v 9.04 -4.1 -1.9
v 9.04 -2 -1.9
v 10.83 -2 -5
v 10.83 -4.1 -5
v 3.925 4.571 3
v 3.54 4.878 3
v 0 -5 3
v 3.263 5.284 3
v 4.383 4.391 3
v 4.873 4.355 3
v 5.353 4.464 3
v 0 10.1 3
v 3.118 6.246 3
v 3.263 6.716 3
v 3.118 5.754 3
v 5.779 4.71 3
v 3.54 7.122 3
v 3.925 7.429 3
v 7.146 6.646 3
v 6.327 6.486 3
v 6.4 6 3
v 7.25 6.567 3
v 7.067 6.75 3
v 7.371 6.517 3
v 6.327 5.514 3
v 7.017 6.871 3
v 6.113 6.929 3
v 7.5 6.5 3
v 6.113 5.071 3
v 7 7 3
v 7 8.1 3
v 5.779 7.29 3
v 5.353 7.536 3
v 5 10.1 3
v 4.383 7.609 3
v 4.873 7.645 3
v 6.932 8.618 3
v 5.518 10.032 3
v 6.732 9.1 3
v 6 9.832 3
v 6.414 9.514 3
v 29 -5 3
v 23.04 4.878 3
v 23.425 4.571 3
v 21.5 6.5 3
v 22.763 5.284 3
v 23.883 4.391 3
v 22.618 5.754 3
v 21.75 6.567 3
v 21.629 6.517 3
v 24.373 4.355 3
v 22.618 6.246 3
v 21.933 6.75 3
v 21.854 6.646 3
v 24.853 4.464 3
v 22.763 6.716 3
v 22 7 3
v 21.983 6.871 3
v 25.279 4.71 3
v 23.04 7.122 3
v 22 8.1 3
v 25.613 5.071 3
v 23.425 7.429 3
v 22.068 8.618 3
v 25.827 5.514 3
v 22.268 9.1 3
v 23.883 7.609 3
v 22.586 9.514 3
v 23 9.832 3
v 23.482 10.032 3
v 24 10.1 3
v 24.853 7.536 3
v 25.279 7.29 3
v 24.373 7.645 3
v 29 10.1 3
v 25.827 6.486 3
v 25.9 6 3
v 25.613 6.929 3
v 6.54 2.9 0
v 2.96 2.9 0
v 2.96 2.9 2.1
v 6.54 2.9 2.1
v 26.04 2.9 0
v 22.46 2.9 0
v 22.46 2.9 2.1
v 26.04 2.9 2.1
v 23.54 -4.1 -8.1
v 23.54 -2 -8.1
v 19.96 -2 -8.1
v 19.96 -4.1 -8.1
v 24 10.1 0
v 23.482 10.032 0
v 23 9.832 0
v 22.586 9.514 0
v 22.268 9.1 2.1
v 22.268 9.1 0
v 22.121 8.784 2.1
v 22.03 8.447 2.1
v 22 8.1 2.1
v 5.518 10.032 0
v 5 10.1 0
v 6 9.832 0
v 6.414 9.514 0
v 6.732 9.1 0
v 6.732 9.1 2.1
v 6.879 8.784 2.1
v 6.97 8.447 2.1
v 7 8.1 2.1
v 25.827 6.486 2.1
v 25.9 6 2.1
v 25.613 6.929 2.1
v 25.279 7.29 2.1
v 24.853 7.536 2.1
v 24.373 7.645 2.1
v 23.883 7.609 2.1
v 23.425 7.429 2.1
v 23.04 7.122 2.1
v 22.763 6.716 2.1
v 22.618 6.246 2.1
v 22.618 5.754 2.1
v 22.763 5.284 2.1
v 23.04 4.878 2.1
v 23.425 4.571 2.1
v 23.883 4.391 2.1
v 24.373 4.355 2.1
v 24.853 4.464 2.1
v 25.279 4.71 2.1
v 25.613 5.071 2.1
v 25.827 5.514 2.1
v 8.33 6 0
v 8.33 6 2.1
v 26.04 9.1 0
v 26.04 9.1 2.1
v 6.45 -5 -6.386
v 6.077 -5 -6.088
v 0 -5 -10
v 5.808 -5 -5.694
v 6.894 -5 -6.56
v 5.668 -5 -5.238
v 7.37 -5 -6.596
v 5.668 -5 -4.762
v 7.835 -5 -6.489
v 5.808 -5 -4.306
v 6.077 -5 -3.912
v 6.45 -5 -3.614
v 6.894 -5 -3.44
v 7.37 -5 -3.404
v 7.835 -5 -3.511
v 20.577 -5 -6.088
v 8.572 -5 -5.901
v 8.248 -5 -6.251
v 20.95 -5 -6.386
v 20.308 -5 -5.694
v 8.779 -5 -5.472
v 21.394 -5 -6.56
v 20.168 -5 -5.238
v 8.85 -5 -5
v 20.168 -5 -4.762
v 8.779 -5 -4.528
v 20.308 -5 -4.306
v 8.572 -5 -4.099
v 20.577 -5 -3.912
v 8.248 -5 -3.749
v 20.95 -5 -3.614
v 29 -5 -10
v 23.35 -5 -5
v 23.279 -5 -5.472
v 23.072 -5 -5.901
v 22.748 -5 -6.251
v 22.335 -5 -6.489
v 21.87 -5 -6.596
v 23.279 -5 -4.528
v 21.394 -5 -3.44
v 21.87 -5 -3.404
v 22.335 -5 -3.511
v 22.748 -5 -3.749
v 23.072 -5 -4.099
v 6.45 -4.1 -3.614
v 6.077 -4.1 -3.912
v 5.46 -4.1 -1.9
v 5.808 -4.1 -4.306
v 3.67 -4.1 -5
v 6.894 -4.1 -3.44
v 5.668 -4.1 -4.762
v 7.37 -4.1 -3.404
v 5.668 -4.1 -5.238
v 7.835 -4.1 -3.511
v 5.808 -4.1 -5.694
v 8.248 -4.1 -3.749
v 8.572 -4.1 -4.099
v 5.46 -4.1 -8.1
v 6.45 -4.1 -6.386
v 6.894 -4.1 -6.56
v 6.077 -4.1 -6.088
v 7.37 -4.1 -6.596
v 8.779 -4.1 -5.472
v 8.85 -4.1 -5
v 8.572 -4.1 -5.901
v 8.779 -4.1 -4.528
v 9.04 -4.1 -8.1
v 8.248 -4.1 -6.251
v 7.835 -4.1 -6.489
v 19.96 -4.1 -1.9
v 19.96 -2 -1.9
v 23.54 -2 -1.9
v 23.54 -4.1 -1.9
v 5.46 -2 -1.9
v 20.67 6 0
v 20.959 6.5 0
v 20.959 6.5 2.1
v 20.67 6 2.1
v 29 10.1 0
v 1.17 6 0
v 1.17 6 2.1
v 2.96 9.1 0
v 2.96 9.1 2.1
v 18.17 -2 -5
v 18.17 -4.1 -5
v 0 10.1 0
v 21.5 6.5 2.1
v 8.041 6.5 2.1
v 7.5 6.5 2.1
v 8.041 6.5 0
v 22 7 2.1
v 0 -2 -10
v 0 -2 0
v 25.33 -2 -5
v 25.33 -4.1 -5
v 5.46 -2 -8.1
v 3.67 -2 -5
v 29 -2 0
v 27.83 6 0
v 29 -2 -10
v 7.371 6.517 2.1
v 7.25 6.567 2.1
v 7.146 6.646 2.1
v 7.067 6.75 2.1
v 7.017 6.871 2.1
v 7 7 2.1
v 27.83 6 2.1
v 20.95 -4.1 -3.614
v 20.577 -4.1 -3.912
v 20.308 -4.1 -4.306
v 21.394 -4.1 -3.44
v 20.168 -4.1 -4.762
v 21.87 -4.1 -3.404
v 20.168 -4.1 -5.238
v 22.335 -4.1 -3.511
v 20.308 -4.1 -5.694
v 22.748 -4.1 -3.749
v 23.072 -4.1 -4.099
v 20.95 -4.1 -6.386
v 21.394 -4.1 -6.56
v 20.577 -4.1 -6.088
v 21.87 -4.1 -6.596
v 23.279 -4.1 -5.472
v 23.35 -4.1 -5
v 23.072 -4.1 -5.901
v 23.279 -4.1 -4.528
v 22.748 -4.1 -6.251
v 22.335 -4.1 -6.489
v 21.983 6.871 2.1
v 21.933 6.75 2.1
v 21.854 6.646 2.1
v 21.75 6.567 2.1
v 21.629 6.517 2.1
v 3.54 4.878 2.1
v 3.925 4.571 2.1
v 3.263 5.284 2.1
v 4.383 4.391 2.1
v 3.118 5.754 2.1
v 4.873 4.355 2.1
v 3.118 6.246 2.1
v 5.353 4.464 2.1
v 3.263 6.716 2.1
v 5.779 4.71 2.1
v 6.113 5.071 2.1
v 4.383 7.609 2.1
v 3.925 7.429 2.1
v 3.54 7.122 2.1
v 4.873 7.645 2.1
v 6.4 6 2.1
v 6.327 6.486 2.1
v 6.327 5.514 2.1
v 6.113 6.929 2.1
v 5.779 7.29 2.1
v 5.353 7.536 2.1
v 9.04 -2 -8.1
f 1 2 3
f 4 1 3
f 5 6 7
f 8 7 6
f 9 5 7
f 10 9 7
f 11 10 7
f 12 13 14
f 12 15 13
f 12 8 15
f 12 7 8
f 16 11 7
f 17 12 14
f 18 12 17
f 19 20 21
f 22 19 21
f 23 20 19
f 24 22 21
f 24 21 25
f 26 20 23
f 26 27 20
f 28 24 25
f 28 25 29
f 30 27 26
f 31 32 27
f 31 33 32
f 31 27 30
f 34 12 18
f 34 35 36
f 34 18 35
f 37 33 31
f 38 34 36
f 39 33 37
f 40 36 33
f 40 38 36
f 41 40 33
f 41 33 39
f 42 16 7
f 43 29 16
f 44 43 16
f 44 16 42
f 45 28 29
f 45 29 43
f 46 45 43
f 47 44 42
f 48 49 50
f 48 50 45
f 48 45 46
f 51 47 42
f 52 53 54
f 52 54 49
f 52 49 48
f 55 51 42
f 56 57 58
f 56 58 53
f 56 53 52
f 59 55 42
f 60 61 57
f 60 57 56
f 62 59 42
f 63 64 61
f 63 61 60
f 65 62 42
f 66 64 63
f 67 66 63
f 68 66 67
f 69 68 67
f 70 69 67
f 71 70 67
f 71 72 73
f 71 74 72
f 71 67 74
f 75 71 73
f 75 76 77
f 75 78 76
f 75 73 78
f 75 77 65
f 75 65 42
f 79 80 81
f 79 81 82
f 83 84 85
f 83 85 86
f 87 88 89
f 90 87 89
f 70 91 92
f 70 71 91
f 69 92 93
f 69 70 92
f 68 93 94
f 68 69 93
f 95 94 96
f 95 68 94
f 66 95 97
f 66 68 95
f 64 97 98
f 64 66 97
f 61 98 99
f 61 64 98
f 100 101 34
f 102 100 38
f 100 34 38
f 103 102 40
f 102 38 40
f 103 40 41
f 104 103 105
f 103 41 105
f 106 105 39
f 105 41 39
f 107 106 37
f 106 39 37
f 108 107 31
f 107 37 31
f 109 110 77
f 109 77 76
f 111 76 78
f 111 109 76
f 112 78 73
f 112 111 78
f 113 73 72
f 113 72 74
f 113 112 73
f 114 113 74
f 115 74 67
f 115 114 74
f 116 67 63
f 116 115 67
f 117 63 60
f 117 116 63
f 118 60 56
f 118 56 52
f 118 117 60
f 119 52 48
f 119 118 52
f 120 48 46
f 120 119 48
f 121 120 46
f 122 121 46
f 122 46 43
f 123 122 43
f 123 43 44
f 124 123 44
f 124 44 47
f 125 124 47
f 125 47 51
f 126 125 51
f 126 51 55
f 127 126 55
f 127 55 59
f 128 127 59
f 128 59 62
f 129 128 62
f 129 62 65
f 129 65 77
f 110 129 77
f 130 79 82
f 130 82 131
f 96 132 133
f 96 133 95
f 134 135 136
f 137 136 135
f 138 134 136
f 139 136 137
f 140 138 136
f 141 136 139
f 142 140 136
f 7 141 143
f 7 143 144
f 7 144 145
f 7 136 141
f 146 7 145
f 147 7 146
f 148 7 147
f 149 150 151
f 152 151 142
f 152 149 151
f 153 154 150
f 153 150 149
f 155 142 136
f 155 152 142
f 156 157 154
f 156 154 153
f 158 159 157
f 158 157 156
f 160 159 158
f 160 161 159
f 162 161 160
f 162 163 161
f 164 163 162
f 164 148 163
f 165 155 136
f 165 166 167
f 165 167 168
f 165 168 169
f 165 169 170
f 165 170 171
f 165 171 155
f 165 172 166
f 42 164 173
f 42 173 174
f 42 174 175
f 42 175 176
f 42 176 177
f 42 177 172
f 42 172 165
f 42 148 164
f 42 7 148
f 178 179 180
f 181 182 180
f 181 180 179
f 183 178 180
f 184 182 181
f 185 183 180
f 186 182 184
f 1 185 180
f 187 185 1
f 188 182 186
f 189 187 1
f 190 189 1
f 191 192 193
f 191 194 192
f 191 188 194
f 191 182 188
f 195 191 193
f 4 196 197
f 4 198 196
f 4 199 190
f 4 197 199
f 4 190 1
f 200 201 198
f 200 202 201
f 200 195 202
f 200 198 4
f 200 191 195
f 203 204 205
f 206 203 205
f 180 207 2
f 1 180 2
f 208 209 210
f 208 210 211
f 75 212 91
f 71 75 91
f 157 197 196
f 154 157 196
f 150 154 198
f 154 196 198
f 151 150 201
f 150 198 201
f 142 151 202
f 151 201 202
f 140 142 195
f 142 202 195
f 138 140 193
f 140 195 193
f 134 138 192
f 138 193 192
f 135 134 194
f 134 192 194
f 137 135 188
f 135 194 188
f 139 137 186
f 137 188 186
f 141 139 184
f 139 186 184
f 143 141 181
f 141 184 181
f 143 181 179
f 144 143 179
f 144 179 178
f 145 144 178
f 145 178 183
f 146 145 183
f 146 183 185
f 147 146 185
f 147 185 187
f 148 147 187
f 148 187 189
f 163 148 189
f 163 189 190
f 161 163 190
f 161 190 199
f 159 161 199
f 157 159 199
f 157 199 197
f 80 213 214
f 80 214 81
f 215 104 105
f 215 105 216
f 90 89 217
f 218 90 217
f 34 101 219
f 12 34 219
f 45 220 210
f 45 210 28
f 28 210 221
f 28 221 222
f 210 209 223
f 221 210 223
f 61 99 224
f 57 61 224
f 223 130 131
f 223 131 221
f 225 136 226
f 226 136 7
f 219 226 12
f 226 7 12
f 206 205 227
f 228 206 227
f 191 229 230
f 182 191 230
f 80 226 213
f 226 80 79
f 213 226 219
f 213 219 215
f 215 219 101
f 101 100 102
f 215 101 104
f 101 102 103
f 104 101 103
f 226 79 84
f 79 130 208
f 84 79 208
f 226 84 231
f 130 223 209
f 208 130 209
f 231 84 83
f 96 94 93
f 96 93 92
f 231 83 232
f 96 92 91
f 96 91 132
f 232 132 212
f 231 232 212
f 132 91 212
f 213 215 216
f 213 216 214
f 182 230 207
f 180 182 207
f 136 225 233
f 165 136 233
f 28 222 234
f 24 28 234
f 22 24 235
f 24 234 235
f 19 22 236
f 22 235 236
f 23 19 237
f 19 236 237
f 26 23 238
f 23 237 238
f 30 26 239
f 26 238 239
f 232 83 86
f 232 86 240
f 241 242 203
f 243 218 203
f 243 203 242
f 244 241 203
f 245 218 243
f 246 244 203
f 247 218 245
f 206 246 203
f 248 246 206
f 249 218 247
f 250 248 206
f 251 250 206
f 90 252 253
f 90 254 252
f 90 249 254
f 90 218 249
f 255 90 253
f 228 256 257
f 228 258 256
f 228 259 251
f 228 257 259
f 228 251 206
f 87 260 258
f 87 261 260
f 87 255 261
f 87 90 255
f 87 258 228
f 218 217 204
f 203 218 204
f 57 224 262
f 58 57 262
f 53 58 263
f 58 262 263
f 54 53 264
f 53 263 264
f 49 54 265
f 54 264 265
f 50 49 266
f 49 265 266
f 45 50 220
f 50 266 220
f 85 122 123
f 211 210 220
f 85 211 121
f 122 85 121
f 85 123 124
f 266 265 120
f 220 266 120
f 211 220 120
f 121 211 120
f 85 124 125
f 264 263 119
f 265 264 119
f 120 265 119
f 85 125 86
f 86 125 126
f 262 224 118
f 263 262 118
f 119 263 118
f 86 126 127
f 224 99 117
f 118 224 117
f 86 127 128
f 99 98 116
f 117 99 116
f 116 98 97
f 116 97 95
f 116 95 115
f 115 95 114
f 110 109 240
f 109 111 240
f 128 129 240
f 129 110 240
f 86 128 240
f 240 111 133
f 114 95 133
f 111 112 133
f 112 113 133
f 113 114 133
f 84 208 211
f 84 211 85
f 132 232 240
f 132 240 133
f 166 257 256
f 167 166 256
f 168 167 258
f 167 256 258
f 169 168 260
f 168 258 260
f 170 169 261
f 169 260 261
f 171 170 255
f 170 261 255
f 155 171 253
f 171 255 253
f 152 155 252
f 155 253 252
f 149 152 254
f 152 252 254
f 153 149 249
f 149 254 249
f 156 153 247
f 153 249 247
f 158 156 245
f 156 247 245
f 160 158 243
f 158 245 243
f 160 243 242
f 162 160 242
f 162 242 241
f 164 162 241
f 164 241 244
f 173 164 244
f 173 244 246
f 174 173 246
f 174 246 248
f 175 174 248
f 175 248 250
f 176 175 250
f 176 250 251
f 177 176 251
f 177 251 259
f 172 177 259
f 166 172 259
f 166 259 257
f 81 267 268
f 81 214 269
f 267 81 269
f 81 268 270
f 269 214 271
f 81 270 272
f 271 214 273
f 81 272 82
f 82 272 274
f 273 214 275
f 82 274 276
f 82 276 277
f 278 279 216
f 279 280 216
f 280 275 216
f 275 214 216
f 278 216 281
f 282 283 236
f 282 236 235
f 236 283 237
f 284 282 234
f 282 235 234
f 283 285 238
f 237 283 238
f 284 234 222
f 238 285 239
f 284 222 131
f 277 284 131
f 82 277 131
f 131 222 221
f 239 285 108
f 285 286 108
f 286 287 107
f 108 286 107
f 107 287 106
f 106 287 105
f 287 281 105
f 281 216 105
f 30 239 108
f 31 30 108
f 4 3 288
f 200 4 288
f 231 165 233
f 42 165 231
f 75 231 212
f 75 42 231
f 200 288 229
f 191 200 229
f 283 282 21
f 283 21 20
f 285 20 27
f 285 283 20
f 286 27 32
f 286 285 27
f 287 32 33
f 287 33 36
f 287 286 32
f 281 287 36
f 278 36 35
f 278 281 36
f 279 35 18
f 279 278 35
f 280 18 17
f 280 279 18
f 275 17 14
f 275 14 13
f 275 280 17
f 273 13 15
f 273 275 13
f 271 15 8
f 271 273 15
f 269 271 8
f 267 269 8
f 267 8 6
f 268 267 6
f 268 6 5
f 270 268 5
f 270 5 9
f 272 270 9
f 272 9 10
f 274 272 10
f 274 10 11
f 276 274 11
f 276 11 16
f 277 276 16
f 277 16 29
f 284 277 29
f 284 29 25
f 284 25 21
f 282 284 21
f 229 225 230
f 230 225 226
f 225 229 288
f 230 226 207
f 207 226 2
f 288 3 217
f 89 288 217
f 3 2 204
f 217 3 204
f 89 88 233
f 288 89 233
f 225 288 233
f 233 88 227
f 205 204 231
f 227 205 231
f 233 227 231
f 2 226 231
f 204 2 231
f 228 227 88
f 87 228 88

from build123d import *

# Parameters (mm, degrees)
SKETCH1_R           = 1.65
BOSS_EXTRUDE1_DEPTH = 3
SKETCH1_3_R         = 1.65
CUT_EXTRUDE1_DEPTH  = 2.1
FILLET3_R           = 2
SKETCH2_W           = 29
SKETCH2_H           = 2
BOSS_EXTRUDE2_DEPTH = 3
SKETCH2_3_W         = 29
SKETCH2_3_H         = 3
BOSS_EXTRUDE3_DEPTH = 13
SKETCH3_R           = 1.6
CUT_EXTRUDE2_DEPTH  = 33.975900291
SKETCH3_3_R         = 1.6
CUT_EXTRUDE3_DEPTH  = 2.1


with BuildPart() as part:
    # Sketch1 → Boss-Extrude1 (new body)
    with BuildSketch(Plane.XY):
        with BuildLine():
            Line((0, 0), (29, 0))
            Line((29, 0), (29, 10.1))
            Line((29, 10.1), (22, 10.1))
            Line((22, 10.1), (22, 7))
            ThreePointArc((22, 7), (21.853553391, 6.646446609), (21.5, 6.5))
            Line((21.5, 6.5), (7.5, 6.5))
            ThreePointArc((7.5, 6.5), (7.146446609, 6.646446609), (7, 7))
            Line((7, 7), (7, 10.1))
            Line((7, 10.1), (0, 10.1))
            Line((0, 10.1), (0, 0))
        make_face()
        with Locations((4.75, 6)):
            Circle(SKETCH1_R, mode=Mode.SUBTRACT)
        with Locations((24.25, 6)):
            Circle(SKETCH1_R, mode=Mode.SUBTRACT)
    extrude(amount=BOSS_EXTRUDE1_DEPTH)

    # Sketch1<3> → Cut-Extrude1 (cut)
    # profile 1 of 2: a face of its own
    with BuildSketch(Plane.XY):
        with BuildLine():
            Line((2.960214166, 9.1), (1.170428331, 6))
            Line((1.170428331, 6), (2.960214166, 2.9))
            Line((2.960214166, 2.9), (6.539785834, 2.9))
            Line((6.539785834, 2.9), (8.329571669, 6))
            Line((8.329571669, 6), (8.040896534, 6.5))
            Line((8.040896534, 6.5), (7.5, 6.5))
            ThreePointArc((7.5, 6.5), (7.146446609, 6.646446609), (7, 7))
            Line((7, 7), (7, 9.1))
            Line((7, 9.1), (2.960214166, 9.1))
        make_face()
        with Locations((4.75, 6)):
            Circle(SKETCH1_3_R, mode=Mode.SUBTRACT)
    # profile 2 of 2: a face of its own
    with BuildSketch(Plane.XY):
        with BuildLine():
            Line((27.829571669, 6), (26.039785834, 9.1))
            Line((26.039785834, 9.1), (22, 9.1))
            Line((22, 9.1), (22, 7))
            ThreePointArc((22, 7), (21.853553391, 6.646446609), (21.5, 6.5))
            Line((21.5, 6.5), (20.959103466, 6.5))
            Line((20.959103466, 6.5), (20.670428331, 6))
            Line((20.670428331, 6), (22.460214166, 2.9))
            Line((22.460214166, 2.9), (26.039785834, 2.9))
            Line((26.039785834, 2.9), (27.829571669, 6))
        make_face()
        with Locations((24.25, 6)):
            Circle(SKETCH1_3_R, mode=Mode.SUBTRACT)
    extrude(amount=CUT_EXTRUDE1_DEPTH, mode=Mode.SUBTRACT)

    # Fillet3
    fillet3_edges = [part.edges().sort_by_distance(p)[0] for p in [
        (7, 10.1, 1.5),
        (22, 10.1, 1.5),
    ]]
    fillet(fillet3_edges, radius=FILLET3_R)

    # Sketch2 → Boss-Extrude2 (add)
    with BuildSketch(Plane.XY.offset(3)):
        with Locations((14.5, -1)):
            Rectangle(SKETCH2_W, SKETCH2_H)
    extrude(amount=-BOSS_EXTRUDE2_DEPTH)

    # Sketch2<3> → Boss-Extrude3 (add)
    with BuildSketch(Plane.XY.offset(3)):
        with Locations((14.5, -3.5)):
            Rectangle(SKETCH2_3_W, SKETCH2_3_H)
    extrude(amount=-BOSS_EXTRUDE3_DEPTH)

    # Sketch3 → Cut-Extrude2 (cut, through all)
    with BuildSketch(Plane(origin=(0, -2, 0), x_dir=(1, 0, 0), z_dir=(0, 1, 0))):
        with Locations((21.75, 5)):
            Circle(SKETCH3_R)
        with Locations((7.25, 5)):
            Circle(SKETCH3_R)
    extrude(amount=-CUT_EXTRUDE2_DEPTH, mode=Mode.SUBTRACT)

    # Sketch3<3> → Cut-Extrude3 (cut)
    # profile 1 of 2: a face of its own
    with BuildSketch(Plane(origin=(0, -2, 0), x_dir=(1, 0, 0), z_dir=(0, 1, 0))):
        Polygon((23.539785834, 1.9), (25.329571669, 5), (23.539785834, 8.1), (19.960214166, 8.1), (18.170428331, 5), (19.960214166, 1.9), align=None)
        with Locations((21.75, 5)):
            Circle(SKETCH3_3_R, mode=Mode.SUBTRACT)
    # profile 2 of 2: a face of its own
    with BuildSketch(Plane(origin=(0, -2, 0), x_dir=(1, 0, 0), z_dir=(0, 1, 0))):
        Polygon((9.039785834, 1.9), (10.829571669, 5), (9.039785834, 8.1), (5.460214166, 8.1), (3.670428331, 5), (5.460214166, 1.9), align=None)
        with Locations((7.25, 5)):
            Circle(SKETCH3_3_R, mode=Mode.SUBTRACT)
    extrude(amount=-CUT_EXTRUDE3_DEPTH, mode=Mode.SUBTRACT)


solid = part.part
